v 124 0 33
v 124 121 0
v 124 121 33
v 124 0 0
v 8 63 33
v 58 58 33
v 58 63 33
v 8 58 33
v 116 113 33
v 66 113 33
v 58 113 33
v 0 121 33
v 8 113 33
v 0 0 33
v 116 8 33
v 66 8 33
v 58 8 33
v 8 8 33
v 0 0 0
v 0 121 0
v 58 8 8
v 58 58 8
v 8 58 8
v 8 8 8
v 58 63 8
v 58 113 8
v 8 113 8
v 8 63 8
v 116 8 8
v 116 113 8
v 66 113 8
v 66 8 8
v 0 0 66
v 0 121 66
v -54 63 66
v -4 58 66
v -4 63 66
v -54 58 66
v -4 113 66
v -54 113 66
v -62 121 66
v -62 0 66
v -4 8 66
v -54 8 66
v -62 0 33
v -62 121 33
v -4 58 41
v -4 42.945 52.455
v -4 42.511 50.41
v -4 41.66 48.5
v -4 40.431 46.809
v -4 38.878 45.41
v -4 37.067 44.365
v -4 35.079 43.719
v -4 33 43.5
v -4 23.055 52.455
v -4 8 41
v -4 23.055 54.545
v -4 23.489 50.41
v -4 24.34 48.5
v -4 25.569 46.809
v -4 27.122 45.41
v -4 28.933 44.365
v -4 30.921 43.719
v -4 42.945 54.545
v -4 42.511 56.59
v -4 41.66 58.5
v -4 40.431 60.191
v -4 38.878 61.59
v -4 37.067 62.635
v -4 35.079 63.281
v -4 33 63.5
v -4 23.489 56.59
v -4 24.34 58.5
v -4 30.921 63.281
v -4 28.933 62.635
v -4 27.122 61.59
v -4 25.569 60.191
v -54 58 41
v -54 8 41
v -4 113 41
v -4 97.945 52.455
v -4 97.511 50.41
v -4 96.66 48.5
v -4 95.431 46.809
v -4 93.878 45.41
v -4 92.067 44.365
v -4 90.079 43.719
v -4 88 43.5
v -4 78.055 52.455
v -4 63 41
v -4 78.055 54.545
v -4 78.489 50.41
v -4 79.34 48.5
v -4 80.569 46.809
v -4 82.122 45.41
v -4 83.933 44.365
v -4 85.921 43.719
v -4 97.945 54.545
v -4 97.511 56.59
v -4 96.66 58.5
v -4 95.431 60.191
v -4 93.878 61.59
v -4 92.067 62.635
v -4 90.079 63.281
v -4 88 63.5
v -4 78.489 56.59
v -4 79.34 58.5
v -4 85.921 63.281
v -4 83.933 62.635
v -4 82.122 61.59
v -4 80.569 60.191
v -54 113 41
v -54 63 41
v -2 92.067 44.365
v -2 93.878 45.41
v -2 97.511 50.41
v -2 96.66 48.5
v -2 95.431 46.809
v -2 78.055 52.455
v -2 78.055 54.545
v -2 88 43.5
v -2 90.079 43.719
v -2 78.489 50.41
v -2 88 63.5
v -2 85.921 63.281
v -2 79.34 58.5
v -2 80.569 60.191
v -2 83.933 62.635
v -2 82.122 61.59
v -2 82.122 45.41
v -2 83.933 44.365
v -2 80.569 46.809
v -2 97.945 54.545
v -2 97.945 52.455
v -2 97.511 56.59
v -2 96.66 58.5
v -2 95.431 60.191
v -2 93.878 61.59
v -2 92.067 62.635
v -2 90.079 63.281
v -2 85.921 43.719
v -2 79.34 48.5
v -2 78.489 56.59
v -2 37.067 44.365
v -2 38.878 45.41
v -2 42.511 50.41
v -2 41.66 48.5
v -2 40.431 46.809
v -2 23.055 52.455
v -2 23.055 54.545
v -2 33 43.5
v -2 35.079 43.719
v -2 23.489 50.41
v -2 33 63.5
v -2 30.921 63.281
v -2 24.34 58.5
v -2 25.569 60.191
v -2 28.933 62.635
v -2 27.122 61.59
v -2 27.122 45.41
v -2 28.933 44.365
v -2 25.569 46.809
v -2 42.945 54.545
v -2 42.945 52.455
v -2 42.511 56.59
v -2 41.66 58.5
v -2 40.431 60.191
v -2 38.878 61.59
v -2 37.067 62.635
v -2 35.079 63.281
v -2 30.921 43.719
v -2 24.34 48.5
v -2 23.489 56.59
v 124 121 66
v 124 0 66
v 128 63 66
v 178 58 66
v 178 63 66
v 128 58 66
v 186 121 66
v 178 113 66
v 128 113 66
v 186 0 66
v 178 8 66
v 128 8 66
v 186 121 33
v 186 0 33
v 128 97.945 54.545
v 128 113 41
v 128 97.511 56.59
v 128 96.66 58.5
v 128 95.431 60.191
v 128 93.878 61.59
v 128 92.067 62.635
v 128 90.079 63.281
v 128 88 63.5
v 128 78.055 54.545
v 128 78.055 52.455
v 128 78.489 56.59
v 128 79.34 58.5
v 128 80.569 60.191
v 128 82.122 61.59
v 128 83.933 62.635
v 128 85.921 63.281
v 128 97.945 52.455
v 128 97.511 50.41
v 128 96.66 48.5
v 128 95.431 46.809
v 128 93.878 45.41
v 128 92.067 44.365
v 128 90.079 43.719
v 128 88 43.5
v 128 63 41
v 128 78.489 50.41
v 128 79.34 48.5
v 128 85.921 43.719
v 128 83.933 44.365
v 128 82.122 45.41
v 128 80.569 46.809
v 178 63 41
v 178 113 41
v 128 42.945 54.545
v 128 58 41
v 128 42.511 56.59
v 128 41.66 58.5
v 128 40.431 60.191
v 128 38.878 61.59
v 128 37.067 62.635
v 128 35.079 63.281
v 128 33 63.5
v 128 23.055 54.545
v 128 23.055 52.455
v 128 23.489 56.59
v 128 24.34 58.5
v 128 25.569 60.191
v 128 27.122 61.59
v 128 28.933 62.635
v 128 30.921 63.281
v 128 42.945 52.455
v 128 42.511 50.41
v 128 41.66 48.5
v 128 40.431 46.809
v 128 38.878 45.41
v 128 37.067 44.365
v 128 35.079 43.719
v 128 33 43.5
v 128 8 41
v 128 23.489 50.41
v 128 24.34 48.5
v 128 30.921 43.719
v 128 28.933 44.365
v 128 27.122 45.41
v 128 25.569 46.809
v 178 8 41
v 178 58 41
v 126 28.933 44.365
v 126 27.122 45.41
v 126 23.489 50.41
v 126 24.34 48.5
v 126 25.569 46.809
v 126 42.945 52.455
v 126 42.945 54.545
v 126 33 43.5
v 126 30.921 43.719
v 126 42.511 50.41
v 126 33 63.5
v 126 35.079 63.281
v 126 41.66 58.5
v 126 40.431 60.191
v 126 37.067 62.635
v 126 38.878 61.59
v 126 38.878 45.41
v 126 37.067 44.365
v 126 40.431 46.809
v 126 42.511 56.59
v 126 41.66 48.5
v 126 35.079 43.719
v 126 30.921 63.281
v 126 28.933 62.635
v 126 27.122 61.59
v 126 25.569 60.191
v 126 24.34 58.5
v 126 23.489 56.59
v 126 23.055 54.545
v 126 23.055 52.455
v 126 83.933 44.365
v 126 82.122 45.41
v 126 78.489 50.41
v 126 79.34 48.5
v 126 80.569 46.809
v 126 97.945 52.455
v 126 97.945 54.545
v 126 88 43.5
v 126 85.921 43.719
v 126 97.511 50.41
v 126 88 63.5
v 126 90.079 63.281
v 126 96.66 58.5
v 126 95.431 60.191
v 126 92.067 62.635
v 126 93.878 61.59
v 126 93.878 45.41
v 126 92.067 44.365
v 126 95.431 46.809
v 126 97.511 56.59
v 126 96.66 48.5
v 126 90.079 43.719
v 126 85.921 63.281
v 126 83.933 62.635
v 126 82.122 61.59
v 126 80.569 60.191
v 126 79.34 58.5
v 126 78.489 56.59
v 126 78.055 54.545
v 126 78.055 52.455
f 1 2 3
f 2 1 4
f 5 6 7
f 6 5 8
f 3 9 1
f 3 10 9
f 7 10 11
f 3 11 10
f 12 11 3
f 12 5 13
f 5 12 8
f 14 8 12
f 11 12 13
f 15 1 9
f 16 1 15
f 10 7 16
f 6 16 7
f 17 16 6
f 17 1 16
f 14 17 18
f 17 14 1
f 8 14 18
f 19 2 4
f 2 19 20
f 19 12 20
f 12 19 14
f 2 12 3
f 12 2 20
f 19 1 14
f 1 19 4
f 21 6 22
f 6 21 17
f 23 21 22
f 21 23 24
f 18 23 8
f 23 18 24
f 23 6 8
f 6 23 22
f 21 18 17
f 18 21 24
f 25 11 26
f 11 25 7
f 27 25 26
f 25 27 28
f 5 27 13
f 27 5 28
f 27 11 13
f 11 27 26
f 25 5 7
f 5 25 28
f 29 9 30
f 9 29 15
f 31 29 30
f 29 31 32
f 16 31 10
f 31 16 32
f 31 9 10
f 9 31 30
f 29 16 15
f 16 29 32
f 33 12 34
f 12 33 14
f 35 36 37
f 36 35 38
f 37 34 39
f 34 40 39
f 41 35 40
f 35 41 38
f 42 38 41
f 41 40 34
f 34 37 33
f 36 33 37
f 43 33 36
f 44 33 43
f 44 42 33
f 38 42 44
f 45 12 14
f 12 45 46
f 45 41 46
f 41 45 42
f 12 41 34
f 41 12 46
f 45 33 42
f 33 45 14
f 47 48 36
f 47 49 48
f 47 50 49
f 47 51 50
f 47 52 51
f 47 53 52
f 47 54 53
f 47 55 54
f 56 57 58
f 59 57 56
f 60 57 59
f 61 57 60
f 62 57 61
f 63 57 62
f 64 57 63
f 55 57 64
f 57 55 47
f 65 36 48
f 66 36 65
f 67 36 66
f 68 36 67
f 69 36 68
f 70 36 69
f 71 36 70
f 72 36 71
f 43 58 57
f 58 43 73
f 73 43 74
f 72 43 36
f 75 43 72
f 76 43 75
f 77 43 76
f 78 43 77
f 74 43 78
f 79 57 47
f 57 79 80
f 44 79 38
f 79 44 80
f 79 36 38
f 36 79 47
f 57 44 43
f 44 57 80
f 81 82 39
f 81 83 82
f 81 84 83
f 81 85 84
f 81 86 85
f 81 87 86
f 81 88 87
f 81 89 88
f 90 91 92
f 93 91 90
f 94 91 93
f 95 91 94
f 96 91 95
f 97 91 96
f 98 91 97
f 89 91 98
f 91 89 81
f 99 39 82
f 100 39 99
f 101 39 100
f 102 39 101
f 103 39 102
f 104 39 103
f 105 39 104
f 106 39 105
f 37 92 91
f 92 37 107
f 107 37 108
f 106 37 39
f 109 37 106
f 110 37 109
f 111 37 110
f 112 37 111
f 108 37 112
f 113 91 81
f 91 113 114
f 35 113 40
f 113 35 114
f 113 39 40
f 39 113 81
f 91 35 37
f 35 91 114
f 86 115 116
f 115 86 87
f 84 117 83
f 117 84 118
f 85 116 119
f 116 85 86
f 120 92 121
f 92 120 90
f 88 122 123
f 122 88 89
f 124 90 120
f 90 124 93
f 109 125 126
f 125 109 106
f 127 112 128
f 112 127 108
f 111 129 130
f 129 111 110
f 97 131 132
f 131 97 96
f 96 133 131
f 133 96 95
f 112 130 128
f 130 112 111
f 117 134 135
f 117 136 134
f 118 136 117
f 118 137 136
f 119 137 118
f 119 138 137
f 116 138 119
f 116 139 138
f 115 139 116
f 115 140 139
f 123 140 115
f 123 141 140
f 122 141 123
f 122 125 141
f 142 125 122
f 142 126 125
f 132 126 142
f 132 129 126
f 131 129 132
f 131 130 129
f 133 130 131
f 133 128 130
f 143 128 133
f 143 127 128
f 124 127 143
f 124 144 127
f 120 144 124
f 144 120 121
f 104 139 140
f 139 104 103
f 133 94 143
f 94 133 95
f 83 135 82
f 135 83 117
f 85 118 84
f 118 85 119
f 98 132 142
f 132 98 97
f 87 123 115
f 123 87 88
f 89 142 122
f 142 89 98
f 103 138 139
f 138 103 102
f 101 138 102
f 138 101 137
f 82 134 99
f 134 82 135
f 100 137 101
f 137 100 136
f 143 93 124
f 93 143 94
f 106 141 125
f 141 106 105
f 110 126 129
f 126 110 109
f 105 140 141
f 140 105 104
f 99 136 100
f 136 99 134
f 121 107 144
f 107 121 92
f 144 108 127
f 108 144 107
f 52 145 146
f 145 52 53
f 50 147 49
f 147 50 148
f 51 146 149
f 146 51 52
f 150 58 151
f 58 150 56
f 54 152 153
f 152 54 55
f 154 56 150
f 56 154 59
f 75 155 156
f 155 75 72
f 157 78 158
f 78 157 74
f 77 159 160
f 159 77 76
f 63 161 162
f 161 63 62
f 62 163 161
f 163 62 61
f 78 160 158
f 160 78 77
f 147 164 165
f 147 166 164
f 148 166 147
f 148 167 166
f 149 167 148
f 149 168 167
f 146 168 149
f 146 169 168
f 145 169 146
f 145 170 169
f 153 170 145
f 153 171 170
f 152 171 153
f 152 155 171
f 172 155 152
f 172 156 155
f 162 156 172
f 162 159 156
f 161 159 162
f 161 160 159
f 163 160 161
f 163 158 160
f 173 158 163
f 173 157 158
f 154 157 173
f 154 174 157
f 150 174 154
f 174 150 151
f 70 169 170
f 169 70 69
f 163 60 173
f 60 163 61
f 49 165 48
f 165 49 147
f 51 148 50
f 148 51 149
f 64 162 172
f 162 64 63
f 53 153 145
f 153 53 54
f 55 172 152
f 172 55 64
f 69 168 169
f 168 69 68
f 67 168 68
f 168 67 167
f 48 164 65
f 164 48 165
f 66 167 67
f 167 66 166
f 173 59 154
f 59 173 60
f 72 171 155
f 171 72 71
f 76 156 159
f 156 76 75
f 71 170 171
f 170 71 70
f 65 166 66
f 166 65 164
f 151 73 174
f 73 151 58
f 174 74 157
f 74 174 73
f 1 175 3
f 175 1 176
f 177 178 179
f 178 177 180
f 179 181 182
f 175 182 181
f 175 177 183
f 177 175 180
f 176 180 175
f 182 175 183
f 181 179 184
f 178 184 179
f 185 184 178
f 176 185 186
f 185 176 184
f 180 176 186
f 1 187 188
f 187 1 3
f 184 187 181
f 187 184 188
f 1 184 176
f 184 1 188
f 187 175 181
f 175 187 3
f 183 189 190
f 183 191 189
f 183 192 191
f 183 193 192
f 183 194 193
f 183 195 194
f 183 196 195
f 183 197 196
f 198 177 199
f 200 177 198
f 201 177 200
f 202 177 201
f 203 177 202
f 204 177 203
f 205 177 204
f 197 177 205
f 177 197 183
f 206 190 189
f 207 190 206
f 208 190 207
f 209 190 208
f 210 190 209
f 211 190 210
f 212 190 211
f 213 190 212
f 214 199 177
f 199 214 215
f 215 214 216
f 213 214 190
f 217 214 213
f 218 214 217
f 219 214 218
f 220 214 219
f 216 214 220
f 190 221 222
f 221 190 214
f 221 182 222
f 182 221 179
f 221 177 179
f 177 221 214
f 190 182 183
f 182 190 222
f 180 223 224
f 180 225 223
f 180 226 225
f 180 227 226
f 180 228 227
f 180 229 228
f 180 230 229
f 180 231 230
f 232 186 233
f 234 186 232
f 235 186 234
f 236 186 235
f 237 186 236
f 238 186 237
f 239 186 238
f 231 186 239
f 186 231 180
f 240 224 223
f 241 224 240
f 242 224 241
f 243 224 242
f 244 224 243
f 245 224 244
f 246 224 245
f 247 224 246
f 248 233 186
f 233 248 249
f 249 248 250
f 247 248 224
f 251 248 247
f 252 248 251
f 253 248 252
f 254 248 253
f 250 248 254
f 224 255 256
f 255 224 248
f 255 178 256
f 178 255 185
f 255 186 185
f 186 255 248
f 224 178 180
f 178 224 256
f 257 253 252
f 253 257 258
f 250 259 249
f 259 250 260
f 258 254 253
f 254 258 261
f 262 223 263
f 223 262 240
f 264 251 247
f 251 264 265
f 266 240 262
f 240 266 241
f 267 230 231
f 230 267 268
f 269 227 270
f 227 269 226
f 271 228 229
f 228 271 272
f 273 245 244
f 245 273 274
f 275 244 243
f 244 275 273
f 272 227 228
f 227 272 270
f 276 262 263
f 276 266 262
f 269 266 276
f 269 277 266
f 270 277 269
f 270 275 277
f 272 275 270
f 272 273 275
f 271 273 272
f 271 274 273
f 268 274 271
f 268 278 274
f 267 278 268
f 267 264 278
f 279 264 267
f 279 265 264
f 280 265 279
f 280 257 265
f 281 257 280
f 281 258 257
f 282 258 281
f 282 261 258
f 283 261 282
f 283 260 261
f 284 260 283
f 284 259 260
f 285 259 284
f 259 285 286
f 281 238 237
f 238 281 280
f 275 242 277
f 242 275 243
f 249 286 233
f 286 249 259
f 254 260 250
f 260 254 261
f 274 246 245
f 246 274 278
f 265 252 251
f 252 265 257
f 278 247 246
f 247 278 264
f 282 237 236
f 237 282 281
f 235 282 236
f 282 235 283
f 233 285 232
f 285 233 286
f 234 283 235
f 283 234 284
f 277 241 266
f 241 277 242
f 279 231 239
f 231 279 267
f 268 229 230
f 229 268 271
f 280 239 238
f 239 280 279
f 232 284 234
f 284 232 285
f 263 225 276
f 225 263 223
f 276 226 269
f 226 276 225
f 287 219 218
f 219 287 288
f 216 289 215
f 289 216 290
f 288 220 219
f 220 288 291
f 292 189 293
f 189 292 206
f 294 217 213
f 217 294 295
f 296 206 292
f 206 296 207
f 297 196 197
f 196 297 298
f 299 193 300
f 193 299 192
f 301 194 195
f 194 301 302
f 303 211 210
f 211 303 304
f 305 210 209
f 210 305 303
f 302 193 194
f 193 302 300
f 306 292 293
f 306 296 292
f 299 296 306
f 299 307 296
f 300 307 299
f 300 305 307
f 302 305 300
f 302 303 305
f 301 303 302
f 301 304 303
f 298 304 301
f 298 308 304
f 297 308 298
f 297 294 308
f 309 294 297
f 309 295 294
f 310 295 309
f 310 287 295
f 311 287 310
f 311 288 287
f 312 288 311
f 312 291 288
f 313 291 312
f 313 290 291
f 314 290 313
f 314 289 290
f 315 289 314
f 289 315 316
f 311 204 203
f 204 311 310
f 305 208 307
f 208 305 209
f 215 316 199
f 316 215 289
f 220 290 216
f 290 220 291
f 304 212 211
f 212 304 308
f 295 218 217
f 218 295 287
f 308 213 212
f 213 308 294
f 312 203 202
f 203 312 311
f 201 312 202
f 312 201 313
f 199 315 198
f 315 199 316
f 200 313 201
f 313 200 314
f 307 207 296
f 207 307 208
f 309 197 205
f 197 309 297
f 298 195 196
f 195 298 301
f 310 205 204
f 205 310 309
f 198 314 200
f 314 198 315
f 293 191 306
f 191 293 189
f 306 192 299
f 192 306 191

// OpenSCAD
OW_THICKNESS = 8;
IW_THICKNESS = 5;
SLOT_SIZES = [50, 50, 25];
ND_SLOT = [20, 2];


module rotate_around(pt, rotation) {
    translate(pt)
    rotate(rotation)
    translate(-pt)
    children();
}


module top_part() {
    difference() {
        cube([1*SLOT_SIZES.x + (3/2)*OW_THICKNESS,
              2*SLOT_SIZES.y + 2*OW_THICKNESS + IW_THICKNESS,
              SLOT_SIZES.z + OW_THICKNESS]);
        translate([OW_THICKNESS, OW_THICKNESS, OW_THICKNESS])
            cube([SLOT_SIZES.x, SLOT_SIZES.y, SLOT_SIZES.z+1]);
        translate([OW_THICKNESS, OW_THICKNESS + IW_THICKNESS + SLOT_SIZES.y, OW_THICKNESS])
            cube([SLOT_SIZES.x, SLOT_SIZES.y, SLOT_SIZES.z+1]);
        translate([OW_THICKNESS + SLOT_SIZES.x -1,
                   OW_THICKNESS + SLOT_SIZES.y/2 + IW_THICKNESS + SLOT_SIZES.y,
                   OW_THICKNESS + SLOT_SIZES.z/2])
            rotate([0, 90, 0])
            cylinder(ND_SLOT.y+1, ND_SLOT.x/2, ND_SLOT.x/2);
        translate([OW_THICKNESS + SLOT_SIZES.x -1,
                   OW_THICKNESS + SLOT_SIZES.y/2,
                   OW_THICKNESS + SLOT_SIZES.z/2])
            rotate([0, 90, 0])
            cylinder(ND_SLOT.y+1, ND_SLOT.x/2, ND_SLOT.x/2);
    }
}


difference() {
    cube([2*SLOT_SIZES.x + 3*OW_THICKNESS,
          2*SLOT_SIZES.y + 2*OW_THICKNESS + IW_THICKNESS,
          SLOT_SIZES.z + OW_THICKNESS]);
    translate([OW_THICKNESS, OW_THICKNESS, OW_THICKNESS])
        cube([SLOT_SIZES.x, SLOT_SIZES.y, SLOT_SIZES.z+1]);
    translate([OW_THICKNESS, OW_THICKNESS + IW_THICKNESS + SLOT_SIZES.y, OW_THICKNESS])
        cube([SLOT_SIZES.x, SLOT_SIZES.y, SLOT_SIZES.z+1]);
    translate([2*OW_THICKNESS + SLOT_SIZES.x, OW_THICKNESS, OW_THICKNESS])
        cube([SLOT_SIZES.x, 2*SLOT_SIZES.y + IW_THICKNESS, SLOT_SIZES.z+1]);
}
translate([-((3/2)*OW_THICKNESS + SLOT_SIZES.x), 0, SLOT_SIZES.z + OW_THICKNESS])
    top_part();
rotate_around([(2*SLOT_SIZES.x + 3*OW_THICKNESS)/2,
               (2*SLOT_SIZES.y + 2*OW_THICKNESS + IW_THICKNESS)/2,
               0],
              [0, 0, 180])
    translate([-((3/2)*OW_THICKNESS + SLOT_SIZES.x), 0, SLOT_SIZES.z + OW_THICKNESS])
    top_part();
